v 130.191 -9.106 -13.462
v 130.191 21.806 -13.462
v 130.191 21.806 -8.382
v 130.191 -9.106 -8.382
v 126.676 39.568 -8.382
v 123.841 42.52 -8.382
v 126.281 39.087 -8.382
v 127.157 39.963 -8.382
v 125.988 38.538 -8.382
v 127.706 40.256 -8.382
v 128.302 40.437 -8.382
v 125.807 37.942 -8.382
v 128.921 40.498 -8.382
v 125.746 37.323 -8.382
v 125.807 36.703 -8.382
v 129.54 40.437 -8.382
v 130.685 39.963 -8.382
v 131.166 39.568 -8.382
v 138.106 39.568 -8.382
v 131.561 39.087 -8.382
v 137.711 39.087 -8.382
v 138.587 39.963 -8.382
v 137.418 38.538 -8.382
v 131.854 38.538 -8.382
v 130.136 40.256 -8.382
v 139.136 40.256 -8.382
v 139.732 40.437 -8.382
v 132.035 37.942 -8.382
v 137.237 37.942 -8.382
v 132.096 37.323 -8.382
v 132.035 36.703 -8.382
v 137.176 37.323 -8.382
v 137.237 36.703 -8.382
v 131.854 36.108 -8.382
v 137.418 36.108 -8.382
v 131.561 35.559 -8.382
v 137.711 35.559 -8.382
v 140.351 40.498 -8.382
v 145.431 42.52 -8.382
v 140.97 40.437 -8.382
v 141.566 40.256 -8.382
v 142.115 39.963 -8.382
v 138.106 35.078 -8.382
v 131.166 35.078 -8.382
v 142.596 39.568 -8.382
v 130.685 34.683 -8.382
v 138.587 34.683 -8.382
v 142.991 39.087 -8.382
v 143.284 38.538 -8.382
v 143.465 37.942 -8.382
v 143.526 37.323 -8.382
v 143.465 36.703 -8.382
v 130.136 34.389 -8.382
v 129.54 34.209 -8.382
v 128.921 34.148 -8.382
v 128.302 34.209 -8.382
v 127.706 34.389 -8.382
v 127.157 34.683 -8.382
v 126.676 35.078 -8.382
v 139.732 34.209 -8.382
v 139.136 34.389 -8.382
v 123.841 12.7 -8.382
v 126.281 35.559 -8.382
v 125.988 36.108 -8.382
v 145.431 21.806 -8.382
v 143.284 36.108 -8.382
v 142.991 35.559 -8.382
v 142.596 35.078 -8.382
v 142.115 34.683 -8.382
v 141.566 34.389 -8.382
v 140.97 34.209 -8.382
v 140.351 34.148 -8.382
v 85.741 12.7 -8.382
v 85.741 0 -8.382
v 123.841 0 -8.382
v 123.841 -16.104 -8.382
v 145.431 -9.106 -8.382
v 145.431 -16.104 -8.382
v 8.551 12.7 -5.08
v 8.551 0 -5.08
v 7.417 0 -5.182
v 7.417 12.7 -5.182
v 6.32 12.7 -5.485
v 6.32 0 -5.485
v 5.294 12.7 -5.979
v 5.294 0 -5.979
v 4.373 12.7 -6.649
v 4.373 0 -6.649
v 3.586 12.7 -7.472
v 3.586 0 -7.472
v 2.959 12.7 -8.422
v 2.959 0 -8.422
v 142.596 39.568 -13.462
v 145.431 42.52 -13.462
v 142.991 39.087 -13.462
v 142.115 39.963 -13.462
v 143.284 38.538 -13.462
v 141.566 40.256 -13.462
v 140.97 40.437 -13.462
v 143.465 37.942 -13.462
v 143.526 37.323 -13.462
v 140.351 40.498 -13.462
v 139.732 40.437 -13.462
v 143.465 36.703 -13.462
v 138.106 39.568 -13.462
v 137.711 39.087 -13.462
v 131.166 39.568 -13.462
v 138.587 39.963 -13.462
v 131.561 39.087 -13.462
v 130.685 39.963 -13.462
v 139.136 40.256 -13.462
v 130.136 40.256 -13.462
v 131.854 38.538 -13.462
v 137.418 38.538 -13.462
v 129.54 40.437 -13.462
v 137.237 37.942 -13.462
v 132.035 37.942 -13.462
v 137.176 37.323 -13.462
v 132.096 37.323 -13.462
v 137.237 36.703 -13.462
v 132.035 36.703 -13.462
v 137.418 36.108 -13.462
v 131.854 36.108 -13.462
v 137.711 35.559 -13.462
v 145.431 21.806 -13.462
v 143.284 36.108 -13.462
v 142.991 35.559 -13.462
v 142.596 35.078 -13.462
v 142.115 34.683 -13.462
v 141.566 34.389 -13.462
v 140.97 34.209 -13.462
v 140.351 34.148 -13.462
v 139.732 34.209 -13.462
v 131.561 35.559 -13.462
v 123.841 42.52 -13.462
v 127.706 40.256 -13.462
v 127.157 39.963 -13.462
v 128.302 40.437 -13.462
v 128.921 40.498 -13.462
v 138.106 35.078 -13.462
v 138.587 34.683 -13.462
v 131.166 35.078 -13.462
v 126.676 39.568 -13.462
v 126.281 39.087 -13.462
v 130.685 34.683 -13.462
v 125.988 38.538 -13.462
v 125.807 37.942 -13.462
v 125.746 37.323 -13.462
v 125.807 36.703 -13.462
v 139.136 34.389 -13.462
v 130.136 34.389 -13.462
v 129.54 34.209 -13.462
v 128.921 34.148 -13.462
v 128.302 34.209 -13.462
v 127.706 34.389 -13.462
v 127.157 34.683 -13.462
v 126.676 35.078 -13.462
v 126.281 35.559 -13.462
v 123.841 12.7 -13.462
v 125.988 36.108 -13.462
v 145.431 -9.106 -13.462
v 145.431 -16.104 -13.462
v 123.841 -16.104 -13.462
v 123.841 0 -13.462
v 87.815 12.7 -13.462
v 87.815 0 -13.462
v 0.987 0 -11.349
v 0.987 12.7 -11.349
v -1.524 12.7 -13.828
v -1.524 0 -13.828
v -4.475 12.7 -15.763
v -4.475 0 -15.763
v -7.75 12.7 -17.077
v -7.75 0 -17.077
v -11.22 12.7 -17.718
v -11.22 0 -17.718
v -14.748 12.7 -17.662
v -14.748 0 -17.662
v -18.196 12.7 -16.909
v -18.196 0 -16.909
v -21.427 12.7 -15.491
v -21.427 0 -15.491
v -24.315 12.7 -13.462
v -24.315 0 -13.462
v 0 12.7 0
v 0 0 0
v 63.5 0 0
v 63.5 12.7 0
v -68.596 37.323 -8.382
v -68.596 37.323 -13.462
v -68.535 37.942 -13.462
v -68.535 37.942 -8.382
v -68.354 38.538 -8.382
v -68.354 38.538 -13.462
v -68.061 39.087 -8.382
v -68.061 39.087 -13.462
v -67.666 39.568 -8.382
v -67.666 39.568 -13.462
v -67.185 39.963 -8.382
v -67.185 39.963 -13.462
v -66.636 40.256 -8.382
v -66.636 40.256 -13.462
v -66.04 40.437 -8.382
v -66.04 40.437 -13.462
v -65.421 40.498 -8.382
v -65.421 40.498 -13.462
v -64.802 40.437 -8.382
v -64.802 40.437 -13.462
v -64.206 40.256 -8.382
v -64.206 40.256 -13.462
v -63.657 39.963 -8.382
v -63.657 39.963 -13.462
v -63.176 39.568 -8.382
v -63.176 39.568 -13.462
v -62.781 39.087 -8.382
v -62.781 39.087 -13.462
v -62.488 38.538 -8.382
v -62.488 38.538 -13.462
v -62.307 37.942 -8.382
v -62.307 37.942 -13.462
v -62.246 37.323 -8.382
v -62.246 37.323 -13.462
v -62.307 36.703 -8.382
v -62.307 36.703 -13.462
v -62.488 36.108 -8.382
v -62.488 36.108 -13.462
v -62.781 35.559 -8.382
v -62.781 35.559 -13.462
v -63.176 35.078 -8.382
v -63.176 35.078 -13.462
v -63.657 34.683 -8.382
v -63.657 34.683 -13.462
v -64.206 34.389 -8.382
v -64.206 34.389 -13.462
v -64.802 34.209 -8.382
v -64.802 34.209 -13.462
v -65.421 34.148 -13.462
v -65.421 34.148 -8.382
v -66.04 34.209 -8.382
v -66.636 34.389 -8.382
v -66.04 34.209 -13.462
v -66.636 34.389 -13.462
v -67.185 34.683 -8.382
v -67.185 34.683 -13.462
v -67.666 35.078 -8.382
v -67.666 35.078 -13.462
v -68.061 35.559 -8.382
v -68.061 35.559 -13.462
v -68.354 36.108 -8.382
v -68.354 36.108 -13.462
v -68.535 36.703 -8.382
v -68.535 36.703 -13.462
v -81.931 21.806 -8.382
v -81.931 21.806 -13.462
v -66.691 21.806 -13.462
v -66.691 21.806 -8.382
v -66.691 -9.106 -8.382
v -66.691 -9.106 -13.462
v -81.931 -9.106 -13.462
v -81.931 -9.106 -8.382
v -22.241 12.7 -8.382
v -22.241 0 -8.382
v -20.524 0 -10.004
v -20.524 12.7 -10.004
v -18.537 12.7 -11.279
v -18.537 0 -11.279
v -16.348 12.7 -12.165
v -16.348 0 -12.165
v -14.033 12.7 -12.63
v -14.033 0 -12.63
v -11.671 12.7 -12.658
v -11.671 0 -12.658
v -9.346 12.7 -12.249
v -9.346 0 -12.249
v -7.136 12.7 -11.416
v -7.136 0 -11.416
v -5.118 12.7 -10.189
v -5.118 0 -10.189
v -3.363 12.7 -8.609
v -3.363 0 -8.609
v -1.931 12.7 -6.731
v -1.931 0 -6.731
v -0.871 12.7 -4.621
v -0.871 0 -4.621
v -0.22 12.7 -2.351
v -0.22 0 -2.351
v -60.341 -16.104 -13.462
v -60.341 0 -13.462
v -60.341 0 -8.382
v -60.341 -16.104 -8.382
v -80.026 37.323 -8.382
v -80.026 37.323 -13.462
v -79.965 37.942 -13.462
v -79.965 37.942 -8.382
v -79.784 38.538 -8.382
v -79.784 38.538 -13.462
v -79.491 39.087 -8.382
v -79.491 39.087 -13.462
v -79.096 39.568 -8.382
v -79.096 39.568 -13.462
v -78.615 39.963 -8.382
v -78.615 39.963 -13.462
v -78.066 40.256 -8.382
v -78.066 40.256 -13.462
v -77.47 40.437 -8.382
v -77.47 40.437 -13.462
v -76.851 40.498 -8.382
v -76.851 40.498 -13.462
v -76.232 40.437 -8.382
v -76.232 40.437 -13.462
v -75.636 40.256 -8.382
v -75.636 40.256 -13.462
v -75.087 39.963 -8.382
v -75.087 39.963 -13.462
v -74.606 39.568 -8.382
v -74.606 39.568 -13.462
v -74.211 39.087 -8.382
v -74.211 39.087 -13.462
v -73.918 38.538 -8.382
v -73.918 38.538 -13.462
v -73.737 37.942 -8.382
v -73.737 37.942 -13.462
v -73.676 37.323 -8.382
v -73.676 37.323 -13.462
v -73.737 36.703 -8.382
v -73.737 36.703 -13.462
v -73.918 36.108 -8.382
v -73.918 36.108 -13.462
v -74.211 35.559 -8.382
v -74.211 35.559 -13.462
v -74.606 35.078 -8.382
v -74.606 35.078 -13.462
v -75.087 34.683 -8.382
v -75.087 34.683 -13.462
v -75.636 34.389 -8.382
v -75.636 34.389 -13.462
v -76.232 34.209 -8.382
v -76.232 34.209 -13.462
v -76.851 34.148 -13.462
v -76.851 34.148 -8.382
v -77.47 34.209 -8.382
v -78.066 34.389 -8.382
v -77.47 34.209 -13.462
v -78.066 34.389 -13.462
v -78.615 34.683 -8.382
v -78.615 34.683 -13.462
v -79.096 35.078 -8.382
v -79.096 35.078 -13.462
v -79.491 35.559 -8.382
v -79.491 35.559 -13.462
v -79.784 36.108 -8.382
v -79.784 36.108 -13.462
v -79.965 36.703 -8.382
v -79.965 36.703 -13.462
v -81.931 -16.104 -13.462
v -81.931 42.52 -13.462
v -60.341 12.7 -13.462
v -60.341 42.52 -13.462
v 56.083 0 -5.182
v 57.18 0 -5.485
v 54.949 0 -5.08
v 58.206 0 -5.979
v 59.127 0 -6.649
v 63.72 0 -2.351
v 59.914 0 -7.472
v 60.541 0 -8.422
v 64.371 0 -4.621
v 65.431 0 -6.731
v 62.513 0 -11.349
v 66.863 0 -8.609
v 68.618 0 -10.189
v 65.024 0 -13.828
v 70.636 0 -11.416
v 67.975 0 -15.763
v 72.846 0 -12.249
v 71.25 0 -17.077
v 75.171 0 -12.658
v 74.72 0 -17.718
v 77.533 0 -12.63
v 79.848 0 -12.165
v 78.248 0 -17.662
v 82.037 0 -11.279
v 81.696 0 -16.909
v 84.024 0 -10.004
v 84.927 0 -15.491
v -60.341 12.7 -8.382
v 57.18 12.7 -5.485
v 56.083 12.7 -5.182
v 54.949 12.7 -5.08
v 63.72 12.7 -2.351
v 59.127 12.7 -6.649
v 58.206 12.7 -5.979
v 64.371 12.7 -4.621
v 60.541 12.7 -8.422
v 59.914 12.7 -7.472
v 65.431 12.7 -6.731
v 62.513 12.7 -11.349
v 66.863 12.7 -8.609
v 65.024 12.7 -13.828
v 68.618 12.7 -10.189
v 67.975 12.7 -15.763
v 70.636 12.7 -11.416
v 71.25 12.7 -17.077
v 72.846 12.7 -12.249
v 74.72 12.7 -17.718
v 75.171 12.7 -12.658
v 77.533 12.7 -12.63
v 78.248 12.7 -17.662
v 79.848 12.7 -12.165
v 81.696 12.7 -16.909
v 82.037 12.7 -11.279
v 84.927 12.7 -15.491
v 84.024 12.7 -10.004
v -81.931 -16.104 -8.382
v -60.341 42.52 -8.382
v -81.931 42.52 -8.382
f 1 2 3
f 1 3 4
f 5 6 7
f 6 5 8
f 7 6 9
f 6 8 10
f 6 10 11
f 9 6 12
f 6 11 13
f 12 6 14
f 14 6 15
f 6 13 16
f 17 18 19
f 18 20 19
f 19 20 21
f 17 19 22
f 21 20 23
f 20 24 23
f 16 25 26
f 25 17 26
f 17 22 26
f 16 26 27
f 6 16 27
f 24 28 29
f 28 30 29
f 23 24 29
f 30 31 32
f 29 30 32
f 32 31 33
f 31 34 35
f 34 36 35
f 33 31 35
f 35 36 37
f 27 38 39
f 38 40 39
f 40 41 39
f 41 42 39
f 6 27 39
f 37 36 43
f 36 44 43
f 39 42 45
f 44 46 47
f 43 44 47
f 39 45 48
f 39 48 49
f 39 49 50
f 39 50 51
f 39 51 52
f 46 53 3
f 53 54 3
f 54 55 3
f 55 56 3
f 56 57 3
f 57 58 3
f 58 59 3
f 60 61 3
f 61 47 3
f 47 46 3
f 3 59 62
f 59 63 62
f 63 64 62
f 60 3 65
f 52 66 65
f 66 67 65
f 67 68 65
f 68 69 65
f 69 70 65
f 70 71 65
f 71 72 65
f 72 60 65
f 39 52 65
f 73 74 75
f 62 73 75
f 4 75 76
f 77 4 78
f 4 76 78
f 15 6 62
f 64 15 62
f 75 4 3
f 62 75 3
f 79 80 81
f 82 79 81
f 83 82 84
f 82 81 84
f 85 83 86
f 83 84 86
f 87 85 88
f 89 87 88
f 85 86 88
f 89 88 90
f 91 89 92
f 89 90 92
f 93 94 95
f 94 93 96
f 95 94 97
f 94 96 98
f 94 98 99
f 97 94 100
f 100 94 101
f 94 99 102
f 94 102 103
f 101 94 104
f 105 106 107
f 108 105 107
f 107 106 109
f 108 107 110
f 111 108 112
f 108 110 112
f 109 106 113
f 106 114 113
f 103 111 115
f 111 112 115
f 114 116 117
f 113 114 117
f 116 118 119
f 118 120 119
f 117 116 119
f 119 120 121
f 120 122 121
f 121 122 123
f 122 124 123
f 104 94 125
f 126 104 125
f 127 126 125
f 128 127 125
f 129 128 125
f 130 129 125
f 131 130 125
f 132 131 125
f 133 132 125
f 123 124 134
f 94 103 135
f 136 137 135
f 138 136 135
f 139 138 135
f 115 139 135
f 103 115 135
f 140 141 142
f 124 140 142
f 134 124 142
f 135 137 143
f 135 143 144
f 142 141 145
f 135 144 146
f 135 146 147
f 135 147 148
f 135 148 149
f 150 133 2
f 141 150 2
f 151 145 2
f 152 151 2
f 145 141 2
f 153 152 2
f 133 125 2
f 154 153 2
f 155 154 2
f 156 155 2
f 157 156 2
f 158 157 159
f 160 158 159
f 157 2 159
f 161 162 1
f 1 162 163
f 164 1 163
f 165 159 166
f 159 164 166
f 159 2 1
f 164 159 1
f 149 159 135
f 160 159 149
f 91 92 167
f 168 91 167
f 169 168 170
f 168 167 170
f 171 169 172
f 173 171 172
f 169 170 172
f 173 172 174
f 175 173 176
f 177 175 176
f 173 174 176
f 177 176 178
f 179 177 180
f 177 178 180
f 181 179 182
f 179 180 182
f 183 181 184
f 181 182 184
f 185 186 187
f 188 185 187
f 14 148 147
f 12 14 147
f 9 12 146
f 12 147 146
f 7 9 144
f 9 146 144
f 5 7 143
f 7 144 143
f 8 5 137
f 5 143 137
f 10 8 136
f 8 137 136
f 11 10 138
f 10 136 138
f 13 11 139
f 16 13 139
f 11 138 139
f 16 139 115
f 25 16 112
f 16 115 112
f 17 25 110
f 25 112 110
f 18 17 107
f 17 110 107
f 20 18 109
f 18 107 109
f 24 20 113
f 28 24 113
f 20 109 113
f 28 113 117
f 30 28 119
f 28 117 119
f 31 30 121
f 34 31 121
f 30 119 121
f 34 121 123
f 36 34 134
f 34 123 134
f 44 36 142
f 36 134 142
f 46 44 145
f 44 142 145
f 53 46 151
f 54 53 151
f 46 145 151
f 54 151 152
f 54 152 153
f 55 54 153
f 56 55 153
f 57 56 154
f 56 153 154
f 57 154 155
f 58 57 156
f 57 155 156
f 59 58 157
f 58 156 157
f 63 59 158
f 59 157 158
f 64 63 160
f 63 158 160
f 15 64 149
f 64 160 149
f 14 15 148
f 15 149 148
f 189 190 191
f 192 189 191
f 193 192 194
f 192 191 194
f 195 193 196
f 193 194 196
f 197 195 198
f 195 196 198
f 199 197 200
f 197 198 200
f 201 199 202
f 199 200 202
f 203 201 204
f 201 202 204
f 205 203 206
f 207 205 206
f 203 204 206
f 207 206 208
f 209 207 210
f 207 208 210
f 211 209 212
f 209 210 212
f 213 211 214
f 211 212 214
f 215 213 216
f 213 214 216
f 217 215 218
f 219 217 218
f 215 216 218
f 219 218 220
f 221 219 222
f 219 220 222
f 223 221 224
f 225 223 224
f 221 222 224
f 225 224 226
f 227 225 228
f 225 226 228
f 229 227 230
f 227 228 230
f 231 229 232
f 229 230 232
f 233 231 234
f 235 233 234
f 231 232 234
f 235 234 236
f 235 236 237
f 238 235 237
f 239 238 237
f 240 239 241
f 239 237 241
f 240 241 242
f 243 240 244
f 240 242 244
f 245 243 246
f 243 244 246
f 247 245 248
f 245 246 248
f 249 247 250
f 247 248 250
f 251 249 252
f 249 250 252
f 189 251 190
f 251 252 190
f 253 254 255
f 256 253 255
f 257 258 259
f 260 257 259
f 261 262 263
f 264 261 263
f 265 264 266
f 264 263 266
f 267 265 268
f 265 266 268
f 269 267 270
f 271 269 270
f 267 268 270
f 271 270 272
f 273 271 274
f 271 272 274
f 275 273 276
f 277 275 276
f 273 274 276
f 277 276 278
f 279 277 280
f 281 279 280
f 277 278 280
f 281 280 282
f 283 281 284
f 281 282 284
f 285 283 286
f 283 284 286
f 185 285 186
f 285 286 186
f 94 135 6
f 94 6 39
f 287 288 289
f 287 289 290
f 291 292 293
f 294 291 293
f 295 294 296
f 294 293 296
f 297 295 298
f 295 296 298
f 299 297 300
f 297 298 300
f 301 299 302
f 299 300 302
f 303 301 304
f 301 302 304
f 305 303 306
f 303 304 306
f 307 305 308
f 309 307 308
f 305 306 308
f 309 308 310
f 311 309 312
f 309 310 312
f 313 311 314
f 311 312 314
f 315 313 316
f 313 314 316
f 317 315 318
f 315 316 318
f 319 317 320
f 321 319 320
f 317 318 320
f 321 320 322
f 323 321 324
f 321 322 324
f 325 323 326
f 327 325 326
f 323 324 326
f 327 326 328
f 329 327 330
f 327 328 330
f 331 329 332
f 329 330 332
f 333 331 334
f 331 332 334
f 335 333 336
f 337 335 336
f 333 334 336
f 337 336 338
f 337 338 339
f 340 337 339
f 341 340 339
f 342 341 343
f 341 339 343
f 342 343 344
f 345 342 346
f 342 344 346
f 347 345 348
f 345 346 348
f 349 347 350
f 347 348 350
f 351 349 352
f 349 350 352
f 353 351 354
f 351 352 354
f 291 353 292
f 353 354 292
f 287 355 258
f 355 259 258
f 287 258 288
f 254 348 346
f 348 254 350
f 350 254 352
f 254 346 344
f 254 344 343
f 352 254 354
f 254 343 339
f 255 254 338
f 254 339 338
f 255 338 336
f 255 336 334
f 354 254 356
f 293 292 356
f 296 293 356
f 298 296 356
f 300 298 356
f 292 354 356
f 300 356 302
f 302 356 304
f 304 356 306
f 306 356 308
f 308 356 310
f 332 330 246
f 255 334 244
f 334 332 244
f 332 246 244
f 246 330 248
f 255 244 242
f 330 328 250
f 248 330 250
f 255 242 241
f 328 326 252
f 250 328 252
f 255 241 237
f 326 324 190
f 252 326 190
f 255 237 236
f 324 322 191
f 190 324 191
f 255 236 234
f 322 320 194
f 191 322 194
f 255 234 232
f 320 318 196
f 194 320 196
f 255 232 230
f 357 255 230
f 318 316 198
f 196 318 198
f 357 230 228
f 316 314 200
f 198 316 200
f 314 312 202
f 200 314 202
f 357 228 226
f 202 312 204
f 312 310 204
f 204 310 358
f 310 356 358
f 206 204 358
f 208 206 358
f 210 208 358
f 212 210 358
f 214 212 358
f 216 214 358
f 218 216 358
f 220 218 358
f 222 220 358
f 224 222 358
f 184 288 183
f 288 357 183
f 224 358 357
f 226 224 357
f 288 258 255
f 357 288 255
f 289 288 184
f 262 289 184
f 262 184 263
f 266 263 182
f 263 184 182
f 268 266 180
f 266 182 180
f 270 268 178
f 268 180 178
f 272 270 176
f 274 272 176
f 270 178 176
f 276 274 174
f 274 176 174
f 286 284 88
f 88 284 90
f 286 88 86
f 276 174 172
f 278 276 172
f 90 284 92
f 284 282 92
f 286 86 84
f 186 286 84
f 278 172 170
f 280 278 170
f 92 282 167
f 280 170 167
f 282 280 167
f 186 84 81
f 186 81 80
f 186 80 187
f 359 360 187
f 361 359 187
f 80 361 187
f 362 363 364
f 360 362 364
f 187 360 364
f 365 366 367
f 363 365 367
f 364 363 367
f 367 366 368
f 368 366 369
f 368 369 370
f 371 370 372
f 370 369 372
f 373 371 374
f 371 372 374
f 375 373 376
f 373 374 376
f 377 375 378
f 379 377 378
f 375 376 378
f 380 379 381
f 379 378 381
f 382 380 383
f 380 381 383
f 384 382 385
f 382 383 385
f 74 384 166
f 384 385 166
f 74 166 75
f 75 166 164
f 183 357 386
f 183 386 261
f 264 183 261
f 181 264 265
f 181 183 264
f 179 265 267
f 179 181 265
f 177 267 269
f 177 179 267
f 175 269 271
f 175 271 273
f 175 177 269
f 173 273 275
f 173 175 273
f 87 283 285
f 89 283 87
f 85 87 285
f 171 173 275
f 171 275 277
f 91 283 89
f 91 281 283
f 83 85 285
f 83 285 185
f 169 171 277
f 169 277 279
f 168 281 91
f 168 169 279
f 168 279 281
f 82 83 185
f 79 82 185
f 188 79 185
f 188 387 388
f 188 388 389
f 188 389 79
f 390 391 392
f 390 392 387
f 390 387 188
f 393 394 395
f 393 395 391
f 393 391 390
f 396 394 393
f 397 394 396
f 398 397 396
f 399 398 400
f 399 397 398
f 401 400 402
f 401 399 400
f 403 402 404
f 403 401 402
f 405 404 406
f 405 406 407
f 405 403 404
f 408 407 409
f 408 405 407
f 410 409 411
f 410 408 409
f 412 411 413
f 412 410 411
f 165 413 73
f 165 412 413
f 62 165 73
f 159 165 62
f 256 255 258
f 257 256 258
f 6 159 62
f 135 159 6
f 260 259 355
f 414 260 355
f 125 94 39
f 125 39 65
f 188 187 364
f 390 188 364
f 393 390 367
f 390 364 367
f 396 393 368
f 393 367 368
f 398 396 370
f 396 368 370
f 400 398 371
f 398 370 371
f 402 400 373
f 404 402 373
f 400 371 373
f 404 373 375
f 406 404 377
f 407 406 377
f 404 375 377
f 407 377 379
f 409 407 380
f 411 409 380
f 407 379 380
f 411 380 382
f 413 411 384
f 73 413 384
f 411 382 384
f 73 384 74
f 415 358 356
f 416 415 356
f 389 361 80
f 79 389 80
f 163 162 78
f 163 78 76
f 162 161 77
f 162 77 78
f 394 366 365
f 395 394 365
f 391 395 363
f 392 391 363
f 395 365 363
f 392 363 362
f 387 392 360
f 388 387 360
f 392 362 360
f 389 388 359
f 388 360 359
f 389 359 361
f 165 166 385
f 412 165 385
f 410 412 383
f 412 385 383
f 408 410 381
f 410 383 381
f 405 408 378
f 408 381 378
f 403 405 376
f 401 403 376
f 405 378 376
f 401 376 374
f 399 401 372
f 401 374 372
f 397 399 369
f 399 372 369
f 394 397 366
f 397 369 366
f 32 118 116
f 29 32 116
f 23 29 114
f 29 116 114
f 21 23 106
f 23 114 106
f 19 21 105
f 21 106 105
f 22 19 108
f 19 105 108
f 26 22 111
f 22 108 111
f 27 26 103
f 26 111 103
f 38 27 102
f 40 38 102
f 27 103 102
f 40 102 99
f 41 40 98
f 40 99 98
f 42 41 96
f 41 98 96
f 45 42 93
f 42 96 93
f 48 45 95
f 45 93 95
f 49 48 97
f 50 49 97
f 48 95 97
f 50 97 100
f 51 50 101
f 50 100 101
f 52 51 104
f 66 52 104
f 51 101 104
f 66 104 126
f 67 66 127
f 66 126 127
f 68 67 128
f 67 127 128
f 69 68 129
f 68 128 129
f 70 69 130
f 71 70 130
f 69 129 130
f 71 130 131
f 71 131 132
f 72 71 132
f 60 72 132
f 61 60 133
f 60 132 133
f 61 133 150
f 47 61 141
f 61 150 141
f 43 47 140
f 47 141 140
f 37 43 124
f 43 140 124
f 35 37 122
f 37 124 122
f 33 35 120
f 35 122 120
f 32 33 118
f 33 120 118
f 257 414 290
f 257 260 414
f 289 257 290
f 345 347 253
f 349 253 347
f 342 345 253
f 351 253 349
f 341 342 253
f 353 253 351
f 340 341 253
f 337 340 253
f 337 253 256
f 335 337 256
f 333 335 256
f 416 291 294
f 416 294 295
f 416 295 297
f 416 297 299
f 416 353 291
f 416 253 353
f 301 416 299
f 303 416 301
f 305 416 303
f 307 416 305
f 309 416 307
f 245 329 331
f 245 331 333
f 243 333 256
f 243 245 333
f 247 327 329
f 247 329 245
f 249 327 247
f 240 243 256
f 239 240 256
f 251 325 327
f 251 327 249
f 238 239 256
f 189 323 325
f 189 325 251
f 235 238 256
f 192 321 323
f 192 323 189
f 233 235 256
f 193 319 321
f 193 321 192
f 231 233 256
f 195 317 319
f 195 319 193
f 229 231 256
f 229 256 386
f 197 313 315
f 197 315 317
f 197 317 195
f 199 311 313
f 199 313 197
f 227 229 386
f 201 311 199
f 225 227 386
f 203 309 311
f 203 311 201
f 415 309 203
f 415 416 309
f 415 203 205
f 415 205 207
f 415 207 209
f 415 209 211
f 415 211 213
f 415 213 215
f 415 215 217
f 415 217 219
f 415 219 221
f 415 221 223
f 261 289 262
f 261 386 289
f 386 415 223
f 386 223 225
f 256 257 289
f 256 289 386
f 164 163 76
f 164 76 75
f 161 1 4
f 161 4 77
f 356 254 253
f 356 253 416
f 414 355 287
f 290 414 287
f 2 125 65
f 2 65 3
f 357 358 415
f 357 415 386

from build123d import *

# Parameters (mm, degrees)
BOSS_EXTRUDE1_DEPTH = 12.7
BOSS_EXTRUDE3_DEPTH = 5.08
SKETCH4_R           = 3.175
CUT_EXTRUDE2_DEPTH  = 5.08


with BuildPart() as part:
    # Sketch1 → Boss-Extrude1 (new body)
    with BuildSketch(Plane(origin=(0, 0, 0), x_dir=(1, 0, 0), z_dir=(0, 1, 0))):
        with BuildLine():
            Line((0, 0), (63.5, 0))
            ThreePointArc((63.5, 0), (71.721251762, 11.884057145), (85.741073105, 8.382))
            Line((85.741073105, 8.382), (123.841073105, 8.382))
            Line((123.841073105, 8.382), (123.841073105, 13.462))
            Line((123.841073105, 13.462), (87.814773179, 13.462))
            ThreePointArc((87.814773179, 13.462), (72.969121208, 17.483987595), (60.541247082, 8.422105263))
            ThreePointArc((60.541247082, 8.422105263), (58.206316594, 5.979191272), (54.948835326, 5.08))
            Line((54.948835326, 5.08), (8.551164674, 5.08))
            ThreePointArc((8.551164674, 5.08), (5.293683406, 5.979191272), (2.958752918, 8.422105263))
            ThreePointArc((2.958752918, 8.422105263), (-9.469121208, 17.483987595), (-24.314773179, 13.462))
            Line((-24.314773179, 13.462), (-60.341073105, 13.462))
            Line((-60.341073105, 13.462), (-60.341073105, 8.382))
            Line((-60.341073105, 8.382), (-22.241073105, 8.382))
            ThreePointArc((-22.241073105, 8.382), (-8.221251762, 11.884057145), (0, 0))
        make_face()
    extrude(amount=BOSS_EXTRUDE1_DEPTH)

    # Sketch3 → Boss-Extrude3 (add)
    with BuildSketch(Plane(origin=(0, 0, -13.462), x_dir=(-1, 0, 0), z_dir=(0, 0, -1))):
        Polygon((81.931073105, -16.1036), (60.341073105, -16.1036), (60.341073105, 28.8036), (60.341073105, 42.5196), (81.931073105, 42.5196), (81.931073105, 28.8036), (81.931073105, 21.8059), (66.691073105, 21.8059), (66.691073105, -9.1059), (81.931073105, -9.1059), align=None)
        Polygon((-123.841073105, -16.1036), (-123.841073105, 28.8036), (-123.841073105, 42.5196), (-145.431073105, 42.5196), (-145.431073105, 28.8036), (-145.431073105, 21.8059), (-130.191073105, 21.8059), (-130.191073105, -9.1059), (-145.431073105, -9.1059), (-145.431073105, -16.1036), align=None)
    extrude(amount=-BOSS_EXTRUDE3_DEPTH)

    # Sketch4 → Cut-Extrude2 (cut)
    with BuildSketch(Plane(origin=(0, 0, -13.462), x_dir=(-1, 0, 0), z_dir=(0, 0, -1))):
        with Locations((-140.351073105, 37.32276)):
            Circle(SKETCH4_R)
        with Locations((-128.921073105, 37.32276)):
            Circle(SKETCH4_R)
        with Locations((65.421073105, 37.32276)):
            Circle(SKETCH4_R)
        with Locations((76.851073105, 37.32276)):
            Circle(SKETCH4_R)
    extrude(amount=-CUT_EXTRUDE2_DEPTH, mode=Mode.SUBTRACT)


solid = part.part
